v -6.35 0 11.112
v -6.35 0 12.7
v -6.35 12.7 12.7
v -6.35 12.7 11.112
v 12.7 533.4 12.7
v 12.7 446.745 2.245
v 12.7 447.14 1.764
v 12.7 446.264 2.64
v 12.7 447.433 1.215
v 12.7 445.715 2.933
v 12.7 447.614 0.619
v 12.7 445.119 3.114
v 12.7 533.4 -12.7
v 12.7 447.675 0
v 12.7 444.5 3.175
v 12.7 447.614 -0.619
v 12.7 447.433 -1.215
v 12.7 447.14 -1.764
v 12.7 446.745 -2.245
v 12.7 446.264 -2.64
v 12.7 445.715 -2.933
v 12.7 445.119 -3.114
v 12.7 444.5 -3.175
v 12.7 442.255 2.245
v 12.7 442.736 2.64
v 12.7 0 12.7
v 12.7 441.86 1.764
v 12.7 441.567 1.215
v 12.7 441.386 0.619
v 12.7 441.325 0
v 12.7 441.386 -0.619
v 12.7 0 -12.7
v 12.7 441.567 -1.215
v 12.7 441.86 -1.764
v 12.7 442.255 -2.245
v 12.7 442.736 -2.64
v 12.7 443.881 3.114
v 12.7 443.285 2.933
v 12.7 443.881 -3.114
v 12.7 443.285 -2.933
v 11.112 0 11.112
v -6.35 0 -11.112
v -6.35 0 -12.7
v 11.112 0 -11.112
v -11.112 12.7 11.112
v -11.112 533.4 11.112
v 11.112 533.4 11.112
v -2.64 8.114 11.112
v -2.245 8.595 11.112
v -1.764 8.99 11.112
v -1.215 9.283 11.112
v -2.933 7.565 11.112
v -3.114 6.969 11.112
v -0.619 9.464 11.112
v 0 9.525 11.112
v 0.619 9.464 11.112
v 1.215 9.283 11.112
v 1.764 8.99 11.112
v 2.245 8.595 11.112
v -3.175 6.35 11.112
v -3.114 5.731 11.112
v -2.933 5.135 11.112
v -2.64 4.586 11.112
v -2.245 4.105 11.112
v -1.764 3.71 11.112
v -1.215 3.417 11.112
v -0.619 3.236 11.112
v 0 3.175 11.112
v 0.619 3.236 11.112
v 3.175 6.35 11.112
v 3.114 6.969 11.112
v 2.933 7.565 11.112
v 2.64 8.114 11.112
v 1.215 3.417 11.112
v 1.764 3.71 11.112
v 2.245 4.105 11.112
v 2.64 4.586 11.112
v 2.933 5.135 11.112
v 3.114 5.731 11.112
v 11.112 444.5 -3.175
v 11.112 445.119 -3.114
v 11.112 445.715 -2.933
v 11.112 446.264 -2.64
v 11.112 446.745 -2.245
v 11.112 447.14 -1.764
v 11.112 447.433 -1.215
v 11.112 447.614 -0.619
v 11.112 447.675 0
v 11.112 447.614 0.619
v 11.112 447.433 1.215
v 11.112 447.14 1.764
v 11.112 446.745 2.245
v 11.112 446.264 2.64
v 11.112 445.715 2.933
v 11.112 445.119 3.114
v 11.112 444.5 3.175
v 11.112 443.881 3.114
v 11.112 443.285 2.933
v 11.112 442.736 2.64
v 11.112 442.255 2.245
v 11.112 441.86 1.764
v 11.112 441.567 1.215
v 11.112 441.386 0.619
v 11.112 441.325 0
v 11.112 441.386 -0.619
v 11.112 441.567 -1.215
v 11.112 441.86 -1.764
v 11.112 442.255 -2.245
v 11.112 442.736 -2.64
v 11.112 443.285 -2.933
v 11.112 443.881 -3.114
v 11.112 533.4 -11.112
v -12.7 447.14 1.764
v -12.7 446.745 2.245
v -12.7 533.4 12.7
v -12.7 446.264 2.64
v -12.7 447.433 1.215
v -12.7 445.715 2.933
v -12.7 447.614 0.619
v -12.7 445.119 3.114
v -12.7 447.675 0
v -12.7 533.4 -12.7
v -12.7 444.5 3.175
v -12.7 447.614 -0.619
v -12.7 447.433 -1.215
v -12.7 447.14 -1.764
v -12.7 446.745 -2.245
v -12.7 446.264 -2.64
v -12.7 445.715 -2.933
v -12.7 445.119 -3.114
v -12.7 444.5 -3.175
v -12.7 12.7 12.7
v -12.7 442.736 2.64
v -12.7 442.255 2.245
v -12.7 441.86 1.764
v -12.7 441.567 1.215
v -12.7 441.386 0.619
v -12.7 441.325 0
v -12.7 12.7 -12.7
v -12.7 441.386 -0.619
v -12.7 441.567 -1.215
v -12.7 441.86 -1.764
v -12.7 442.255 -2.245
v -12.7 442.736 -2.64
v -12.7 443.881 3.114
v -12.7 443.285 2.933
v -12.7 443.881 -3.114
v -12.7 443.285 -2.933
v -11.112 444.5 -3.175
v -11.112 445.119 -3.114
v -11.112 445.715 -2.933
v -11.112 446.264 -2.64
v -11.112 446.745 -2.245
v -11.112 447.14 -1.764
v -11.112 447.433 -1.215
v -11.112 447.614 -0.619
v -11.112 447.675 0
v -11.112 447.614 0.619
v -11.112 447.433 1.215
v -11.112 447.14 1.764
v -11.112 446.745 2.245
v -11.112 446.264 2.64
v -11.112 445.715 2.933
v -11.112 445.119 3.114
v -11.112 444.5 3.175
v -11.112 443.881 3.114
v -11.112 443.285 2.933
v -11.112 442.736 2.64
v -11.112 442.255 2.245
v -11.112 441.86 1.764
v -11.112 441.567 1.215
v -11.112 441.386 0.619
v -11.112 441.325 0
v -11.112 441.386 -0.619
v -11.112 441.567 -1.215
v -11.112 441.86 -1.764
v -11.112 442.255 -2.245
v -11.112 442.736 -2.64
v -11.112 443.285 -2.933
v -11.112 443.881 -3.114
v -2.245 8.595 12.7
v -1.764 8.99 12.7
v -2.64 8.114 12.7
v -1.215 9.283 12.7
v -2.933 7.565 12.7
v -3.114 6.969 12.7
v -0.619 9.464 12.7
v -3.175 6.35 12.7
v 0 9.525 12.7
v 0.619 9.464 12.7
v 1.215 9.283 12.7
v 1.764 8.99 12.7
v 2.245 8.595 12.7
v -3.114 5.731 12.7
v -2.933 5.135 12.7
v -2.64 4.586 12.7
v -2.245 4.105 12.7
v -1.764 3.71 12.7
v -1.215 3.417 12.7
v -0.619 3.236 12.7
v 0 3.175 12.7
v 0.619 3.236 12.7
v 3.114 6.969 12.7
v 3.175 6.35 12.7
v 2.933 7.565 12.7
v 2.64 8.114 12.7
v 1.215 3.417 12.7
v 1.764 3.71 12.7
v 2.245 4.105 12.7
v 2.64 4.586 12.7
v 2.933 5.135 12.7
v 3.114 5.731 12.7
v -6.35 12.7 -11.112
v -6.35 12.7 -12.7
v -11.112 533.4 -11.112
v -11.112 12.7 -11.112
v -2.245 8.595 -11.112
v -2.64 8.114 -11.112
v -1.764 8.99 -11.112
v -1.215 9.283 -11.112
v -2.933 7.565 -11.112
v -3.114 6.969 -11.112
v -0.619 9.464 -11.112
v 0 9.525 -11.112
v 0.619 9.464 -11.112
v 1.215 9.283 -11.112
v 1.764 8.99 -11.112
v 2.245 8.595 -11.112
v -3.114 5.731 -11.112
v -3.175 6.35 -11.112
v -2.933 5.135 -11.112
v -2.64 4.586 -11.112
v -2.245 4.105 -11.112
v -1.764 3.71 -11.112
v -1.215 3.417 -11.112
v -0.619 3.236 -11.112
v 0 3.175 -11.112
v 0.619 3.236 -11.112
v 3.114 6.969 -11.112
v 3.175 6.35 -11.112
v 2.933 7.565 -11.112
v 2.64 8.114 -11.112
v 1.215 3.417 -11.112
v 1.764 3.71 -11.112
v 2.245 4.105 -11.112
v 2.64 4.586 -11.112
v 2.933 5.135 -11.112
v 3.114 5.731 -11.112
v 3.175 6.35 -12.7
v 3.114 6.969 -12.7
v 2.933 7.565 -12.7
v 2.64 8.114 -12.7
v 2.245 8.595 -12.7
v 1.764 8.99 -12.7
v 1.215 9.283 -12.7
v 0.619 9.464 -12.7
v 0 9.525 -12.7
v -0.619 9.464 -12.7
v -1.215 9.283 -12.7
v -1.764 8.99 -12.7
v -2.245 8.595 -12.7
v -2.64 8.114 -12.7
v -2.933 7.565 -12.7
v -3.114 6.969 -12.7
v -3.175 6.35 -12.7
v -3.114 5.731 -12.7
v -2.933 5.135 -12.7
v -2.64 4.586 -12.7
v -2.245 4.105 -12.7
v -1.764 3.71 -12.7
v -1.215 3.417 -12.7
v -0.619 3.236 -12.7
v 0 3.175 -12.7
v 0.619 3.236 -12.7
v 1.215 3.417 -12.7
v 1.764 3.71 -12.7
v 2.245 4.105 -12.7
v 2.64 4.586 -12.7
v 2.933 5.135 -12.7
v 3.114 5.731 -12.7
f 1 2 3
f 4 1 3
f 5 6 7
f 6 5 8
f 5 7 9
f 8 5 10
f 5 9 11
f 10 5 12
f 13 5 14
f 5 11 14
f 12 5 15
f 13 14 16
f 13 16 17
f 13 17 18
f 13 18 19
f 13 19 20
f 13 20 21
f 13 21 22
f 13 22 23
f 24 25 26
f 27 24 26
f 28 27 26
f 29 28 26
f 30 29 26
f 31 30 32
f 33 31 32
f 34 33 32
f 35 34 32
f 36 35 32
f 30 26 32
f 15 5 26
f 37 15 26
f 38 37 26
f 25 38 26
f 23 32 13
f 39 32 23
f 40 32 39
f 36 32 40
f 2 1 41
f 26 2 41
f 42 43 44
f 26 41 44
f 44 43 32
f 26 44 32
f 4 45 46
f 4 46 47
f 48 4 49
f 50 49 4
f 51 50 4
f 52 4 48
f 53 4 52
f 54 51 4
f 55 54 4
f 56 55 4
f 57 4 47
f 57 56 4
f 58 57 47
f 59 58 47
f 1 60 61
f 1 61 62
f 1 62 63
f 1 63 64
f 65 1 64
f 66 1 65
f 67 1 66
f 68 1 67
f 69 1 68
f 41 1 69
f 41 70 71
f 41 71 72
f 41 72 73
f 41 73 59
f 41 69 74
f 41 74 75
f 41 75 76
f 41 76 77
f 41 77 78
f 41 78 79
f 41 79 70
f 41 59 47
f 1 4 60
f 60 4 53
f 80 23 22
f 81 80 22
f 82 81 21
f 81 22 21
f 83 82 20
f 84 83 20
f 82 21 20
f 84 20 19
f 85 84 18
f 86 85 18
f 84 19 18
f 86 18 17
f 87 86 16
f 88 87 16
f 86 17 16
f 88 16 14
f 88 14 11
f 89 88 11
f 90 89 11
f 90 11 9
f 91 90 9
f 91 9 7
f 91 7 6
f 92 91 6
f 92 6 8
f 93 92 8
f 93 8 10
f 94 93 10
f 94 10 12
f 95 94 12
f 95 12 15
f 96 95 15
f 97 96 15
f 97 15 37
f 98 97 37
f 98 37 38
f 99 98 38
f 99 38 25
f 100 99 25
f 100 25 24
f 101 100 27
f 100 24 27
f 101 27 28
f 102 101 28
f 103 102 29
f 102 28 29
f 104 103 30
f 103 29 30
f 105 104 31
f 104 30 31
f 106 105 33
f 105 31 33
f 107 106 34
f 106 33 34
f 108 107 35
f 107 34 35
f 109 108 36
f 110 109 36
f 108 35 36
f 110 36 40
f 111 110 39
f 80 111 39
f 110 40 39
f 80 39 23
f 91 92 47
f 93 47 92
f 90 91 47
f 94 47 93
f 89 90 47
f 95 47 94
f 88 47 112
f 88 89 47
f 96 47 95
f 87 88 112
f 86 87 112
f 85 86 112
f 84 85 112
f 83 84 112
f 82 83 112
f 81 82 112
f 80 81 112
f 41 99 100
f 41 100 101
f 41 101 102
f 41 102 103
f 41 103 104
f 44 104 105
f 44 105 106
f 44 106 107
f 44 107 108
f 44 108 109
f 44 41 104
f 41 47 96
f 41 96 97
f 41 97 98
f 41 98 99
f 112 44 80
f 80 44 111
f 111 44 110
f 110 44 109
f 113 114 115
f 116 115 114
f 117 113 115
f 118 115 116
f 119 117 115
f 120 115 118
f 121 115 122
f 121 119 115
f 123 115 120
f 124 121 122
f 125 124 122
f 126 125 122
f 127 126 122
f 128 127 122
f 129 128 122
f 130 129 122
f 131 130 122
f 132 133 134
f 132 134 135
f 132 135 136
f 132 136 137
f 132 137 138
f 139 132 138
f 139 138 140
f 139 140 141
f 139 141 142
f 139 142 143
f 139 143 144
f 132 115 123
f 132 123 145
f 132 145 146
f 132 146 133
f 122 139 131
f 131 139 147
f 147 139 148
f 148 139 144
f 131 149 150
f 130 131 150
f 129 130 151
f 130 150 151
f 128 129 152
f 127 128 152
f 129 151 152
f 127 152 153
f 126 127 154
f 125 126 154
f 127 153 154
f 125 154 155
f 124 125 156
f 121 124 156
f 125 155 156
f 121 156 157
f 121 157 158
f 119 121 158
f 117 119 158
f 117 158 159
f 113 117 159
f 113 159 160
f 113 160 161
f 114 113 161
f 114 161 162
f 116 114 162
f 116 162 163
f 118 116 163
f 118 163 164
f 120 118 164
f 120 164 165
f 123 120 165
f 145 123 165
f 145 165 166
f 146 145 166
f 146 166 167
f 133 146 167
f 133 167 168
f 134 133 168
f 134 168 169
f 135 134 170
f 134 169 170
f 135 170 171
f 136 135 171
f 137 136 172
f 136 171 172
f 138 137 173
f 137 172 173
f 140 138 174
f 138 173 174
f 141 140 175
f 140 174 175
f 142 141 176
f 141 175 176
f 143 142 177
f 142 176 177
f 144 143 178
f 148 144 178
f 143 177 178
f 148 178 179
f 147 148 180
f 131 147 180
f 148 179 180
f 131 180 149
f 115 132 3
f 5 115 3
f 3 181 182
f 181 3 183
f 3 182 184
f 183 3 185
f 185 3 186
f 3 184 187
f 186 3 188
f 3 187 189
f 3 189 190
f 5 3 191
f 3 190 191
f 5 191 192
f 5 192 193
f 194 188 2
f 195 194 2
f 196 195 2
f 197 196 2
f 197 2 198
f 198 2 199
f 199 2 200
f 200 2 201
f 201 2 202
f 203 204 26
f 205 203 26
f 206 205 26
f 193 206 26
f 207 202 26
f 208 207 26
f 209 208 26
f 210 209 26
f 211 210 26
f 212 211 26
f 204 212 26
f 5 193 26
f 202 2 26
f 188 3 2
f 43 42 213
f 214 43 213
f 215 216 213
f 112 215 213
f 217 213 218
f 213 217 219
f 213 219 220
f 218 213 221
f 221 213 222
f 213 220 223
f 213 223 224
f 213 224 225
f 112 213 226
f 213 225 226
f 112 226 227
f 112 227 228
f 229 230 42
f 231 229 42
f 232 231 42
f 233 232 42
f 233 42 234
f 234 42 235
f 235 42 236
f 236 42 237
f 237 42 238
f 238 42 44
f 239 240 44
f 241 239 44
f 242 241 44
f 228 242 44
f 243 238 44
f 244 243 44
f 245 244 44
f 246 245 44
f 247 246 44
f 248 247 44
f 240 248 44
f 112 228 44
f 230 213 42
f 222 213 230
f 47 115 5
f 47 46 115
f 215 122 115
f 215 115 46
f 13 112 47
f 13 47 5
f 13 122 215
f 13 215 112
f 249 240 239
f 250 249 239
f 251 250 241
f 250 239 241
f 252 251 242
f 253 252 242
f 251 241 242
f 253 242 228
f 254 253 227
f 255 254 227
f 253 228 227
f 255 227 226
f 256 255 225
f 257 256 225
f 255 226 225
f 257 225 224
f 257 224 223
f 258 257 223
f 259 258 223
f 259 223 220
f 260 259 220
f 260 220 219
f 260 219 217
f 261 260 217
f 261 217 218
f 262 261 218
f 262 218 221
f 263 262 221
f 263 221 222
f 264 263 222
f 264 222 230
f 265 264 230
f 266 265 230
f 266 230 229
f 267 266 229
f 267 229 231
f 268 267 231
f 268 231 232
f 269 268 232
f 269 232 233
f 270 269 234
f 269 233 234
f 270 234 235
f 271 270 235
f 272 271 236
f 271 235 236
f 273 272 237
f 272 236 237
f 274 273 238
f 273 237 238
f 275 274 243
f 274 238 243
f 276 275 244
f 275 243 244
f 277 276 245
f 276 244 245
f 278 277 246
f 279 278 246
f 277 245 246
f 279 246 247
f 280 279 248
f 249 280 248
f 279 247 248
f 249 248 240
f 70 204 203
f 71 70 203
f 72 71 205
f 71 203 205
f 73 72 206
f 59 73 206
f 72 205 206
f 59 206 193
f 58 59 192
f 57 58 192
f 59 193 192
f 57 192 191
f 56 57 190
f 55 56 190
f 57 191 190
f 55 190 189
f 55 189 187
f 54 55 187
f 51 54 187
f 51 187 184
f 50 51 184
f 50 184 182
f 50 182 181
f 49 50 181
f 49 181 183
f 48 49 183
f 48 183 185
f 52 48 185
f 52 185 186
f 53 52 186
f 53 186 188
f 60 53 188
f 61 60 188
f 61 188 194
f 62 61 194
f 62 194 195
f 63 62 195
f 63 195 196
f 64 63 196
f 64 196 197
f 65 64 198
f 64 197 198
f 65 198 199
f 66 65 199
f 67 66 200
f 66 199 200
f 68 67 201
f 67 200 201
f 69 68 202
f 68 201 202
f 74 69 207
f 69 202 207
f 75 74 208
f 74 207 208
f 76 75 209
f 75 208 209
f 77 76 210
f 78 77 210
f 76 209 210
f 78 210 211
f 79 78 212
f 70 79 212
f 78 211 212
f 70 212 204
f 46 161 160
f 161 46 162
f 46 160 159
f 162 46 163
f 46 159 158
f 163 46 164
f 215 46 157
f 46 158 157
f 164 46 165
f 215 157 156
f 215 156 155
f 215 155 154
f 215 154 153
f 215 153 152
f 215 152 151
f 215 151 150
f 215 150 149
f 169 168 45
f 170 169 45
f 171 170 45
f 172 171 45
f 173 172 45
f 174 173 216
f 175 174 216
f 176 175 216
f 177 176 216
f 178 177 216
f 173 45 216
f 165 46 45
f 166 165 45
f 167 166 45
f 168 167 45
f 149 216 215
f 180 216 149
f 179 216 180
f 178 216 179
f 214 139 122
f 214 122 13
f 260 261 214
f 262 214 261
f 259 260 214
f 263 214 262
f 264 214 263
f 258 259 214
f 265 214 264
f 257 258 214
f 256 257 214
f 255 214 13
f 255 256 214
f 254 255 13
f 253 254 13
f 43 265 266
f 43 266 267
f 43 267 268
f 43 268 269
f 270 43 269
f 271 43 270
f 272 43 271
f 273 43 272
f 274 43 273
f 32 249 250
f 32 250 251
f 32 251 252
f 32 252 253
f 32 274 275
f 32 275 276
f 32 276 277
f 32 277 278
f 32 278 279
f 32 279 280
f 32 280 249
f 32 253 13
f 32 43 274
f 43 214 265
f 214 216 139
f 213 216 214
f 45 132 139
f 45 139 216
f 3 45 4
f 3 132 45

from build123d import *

# Parameters (mm, degrees)
SKETCH1_W           = 25.4
SKETCH1_H           = 25.4
SKETCH1_W_2         = 22.225
SKETCH1_H_2         = 22.225
BOSS_EXTRUDE1_DEPTH = 533.4
SKETCH2_W           = 6.35
SKETCH2_H           = 12.7
CUT_EXTRUDE1_DEPTH  = 25.4
SKETCH3_R           = 3.175
CUT_EXTRUDE2_DEPTH  = 25.4
SKETCH4_R           = 3.175
CUT_EXTRUDE3_DEPTH  = 25.4


with BuildPart() as part:
    # Sketch1 → Boss-Extrude1 (new body)
    with BuildSketch(Plane(origin=(0, 0, 0), x_dir=(1, 0, 0), z_dir=(0, 1, 0))):
        Rectangle(SKETCH1_W, SKETCH1_H)
        Rectangle(SKETCH1_W_2, SKETCH1_H_2, mode=Mode.SUBTRACT)
    extrude(amount=BOSS_EXTRUDE1_DEPTH)

    # Sketch2 → Cut-Extrude1 (cut)
    with BuildSketch(Plane.XY.offset(12.7)):
        with Locations((-9.525, 6.35)):
            Rectangle(SKETCH2_W, SKETCH2_H)
    extrude(amount=-CUT_EXTRUDE1_DEPTH, mode=Mode.SUBTRACT)

    # Sketch3 → Cut-Extrude2 (cut)
    with BuildSketch(Plane.XY.offset(12.7)):
        with Locations((0, 6.35)):
            Circle(SKETCH3_R)
    extrude(amount=-CUT_EXTRUDE2_DEPTH, mode=Mode.SUBTRACT)

    # Sketch4 → Cut-Extrude3 (cut)
    with BuildSketch(Plane(origin=(12.7, 0, 0), x_dir=(0, 0, -1), z_dir=(1, 0, 0))):
        with Locations((0, 444.5)):
            Circle(SKETCH4_R)
    extrude(amount=-CUT_EXTRUDE3_DEPTH, mode=Mode.SUBTRACT)


solid = part.part
